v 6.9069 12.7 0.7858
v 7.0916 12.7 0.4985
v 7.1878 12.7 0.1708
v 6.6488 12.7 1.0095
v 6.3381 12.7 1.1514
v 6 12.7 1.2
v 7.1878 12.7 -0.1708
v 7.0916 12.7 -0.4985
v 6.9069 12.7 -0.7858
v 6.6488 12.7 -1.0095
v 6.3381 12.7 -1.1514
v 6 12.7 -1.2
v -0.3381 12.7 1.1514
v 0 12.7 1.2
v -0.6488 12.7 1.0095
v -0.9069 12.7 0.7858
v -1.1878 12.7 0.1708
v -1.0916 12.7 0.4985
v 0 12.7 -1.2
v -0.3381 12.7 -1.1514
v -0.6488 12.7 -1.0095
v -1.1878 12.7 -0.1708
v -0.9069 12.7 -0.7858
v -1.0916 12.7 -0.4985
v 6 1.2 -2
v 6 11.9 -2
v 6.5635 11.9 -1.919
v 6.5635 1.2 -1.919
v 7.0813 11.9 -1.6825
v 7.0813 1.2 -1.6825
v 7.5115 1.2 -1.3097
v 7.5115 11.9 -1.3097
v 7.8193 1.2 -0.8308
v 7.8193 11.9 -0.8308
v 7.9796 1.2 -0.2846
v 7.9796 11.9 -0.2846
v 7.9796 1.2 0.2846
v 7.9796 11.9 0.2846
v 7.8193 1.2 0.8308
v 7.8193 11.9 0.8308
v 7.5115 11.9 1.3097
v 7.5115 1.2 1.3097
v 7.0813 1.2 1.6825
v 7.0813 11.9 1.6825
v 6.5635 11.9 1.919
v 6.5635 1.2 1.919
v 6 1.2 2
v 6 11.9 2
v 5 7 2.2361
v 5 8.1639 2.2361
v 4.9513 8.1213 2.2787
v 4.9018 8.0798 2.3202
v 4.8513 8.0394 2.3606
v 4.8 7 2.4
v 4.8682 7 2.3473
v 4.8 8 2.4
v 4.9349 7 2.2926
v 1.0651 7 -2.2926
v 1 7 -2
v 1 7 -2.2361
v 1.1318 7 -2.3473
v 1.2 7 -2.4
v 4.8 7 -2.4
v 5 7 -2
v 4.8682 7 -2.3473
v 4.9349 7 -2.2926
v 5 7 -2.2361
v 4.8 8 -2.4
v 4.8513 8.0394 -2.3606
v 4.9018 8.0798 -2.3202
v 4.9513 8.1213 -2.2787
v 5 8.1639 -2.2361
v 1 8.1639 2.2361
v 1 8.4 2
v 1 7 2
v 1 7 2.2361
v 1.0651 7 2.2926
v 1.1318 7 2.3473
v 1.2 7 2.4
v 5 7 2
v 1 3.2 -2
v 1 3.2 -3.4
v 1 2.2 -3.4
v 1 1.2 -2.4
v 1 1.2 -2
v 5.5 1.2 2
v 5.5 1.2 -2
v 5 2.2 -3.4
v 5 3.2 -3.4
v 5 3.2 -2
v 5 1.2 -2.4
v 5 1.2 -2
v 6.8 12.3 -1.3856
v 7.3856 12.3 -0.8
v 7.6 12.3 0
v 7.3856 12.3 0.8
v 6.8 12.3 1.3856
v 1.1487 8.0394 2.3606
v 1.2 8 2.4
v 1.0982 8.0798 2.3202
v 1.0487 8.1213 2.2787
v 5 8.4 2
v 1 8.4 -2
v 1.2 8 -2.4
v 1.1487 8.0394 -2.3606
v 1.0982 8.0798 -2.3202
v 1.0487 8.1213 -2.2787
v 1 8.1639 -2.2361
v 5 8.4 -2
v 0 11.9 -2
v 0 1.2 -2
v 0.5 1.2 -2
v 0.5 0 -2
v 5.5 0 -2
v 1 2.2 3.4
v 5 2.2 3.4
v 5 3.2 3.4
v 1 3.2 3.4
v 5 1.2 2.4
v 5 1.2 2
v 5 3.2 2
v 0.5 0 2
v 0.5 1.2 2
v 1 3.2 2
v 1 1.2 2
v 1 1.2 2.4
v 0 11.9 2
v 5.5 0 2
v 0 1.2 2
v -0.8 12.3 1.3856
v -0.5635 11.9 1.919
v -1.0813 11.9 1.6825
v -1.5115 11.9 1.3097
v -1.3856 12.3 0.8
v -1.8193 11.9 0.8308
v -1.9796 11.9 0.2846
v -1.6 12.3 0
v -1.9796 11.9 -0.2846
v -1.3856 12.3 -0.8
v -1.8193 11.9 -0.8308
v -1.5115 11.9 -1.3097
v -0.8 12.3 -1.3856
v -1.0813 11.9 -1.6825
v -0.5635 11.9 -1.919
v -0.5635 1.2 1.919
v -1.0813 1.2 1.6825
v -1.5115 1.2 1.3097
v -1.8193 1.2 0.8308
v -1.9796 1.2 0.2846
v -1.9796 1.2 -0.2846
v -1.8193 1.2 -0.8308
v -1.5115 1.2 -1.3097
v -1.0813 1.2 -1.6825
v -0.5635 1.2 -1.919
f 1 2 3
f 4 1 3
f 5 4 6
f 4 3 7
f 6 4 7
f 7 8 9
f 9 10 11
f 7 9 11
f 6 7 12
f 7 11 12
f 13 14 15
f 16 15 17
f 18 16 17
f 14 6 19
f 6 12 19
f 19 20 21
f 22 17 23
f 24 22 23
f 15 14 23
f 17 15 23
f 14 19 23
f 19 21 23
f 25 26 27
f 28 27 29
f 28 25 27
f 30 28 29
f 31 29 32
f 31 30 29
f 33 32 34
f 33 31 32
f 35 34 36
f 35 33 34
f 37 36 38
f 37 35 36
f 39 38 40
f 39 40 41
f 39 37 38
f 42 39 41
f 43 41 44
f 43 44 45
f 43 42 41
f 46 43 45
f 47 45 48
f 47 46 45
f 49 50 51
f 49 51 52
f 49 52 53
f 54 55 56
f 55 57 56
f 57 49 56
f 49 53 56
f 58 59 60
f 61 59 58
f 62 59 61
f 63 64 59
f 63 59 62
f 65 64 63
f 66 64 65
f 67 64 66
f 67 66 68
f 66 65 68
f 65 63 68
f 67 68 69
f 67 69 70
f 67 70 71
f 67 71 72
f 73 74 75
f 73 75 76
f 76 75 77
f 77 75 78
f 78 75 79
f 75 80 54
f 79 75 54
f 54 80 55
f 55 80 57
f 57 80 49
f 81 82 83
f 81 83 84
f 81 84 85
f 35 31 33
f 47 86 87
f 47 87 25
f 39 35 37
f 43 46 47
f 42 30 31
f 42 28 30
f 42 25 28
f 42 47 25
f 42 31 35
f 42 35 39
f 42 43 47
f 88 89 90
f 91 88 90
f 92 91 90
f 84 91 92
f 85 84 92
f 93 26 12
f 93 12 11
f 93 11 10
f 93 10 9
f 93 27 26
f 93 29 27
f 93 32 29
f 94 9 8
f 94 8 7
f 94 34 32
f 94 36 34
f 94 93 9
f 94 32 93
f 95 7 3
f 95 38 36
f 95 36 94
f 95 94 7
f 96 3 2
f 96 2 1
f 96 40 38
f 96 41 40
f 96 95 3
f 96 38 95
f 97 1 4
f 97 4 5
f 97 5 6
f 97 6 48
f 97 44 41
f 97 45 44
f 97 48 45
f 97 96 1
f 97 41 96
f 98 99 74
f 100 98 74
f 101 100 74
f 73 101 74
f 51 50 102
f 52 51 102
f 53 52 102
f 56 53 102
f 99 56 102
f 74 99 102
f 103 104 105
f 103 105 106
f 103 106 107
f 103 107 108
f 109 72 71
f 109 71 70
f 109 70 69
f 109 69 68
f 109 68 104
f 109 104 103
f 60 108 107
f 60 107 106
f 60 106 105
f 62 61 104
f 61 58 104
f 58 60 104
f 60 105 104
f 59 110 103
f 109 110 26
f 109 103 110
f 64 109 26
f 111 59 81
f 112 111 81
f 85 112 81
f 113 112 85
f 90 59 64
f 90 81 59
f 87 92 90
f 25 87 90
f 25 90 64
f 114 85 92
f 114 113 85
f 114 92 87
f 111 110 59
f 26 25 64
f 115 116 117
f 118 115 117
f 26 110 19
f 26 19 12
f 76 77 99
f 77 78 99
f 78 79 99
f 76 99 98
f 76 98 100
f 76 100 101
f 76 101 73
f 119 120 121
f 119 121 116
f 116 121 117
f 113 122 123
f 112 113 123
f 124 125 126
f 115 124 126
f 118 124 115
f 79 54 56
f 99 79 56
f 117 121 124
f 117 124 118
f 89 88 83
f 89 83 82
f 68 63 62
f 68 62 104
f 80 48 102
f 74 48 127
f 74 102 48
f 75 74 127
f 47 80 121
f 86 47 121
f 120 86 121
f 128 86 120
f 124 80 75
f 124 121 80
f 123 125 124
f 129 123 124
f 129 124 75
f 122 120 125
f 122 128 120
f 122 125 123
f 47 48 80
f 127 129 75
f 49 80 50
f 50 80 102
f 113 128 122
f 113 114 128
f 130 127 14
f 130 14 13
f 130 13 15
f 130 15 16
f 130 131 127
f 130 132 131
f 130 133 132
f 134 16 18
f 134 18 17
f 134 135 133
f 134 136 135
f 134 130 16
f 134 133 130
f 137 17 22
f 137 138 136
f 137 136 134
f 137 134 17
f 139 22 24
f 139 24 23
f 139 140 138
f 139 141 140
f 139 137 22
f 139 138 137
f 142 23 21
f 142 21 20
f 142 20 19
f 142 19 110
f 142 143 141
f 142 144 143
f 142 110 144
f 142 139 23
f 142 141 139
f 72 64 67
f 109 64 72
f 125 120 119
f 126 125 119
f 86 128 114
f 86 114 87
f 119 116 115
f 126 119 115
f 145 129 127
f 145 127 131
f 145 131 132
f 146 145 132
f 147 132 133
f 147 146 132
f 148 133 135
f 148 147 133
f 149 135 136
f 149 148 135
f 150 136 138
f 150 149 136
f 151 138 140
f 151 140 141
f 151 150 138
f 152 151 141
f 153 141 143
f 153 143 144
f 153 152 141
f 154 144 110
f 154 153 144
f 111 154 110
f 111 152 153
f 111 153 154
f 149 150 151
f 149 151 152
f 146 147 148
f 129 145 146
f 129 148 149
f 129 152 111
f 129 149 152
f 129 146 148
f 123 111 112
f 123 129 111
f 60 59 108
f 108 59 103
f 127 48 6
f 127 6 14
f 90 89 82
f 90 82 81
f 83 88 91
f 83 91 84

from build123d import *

# Parameters (mm, degrees)
EXTRUDE_1_DEPTH      = 12.7
CUT_EXTRUDE_1_REACH  = 17.534
SKETCH_3_W           = 2.5
SKETCH_3_H           = 1.2
EXTRUDE_2_DEPTH      = 2
EXTRUDE_2_DEPTH_BACK = 2
SKETCH_5_W           = 1.4
SKETCH_5_H           = 2
CUT_EXTRUDE_2_REACH  = 17.39
CHAMFER_1_SIZE       = 1
CHAMFER_2_SIZE       = 0.8


with BuildPart() as part:
    # 草图2 → 凸台-拉伸1 (new body)
    with BuildSketch(Plane(origin=(0, 0, 0), x_dir=(1, 0, 0), z_dir=(0, 1, 0))):
        with BuildLine():
            Line((0, 2), (6, 2))
            ThreePointArc((6, 2), (8, 0), (6, -2))
            Line((6, -2), (0, -2))
            ThreePointArc((0, -2), (-2, 0), (0, 2))
        make_face()
    extrude(amount=EXTRUDE_1_DEPTH)

    # 草图3 → 切除-拉伸1 (cut, up to next)
    with BuildSketch(Plane.XY.offset(2), mode=Mode.PRIVATE) as cut_extrude_1_sk1:
        with Locations((-0.75, 0.6)):
            Rectangle(SKETCH_3_W, SKETCH_3_H)
    cut_extrude_1_tool1 = extrude(cut_extrude_1_sk1.sketch, amount=-CUT_EXTRUDE_1_REACH, mode=Mode.PRIVATE) & part.part
    # 草图3 → 切除-拉伸1 (cut, up to next)
    with BuildSketch(Plane.XY.offset(2), mode=Mode.PRIVATE) as cut_extrude_1_sk2:
        with Locations((6.75, 0.6)):
            Rectangle(SKETCH_3_W, SKETCH_3_H)
    cut_extrude_1_tool2 = extrude(cut_extrude_1_sk2.sketch, amount=-CUT_EXTRUDE_1_REACH, mode=Mode.PRIVATE) & part.part
    add(cut_extrude_1_tool1.solids().sort_by_distance((-0.75, 0.6, 2))[0], mode=Mode.SUBTRACT)
    add(cut_extrude_1_tool2.solids().sort_by_distance((6.75, 0.6, 2))[0], mode=Mode.SUBTRACT)

    # 草图5 → 凸台-拉伸2 (add, two sides: drawn at the far end of the back side and taken through both)
    with BuildSketch(Plane.ZY.offset(-3).offset(-EXTRUDE_2_DEPTH_BACK)):
        Polygon((-2, 7), (-2.4, 7), (-2.4, 8), (-2, 8.4), align=None)
        Polygon((2, 8.4), (2, 7), (2.4, 7), (2.4, 8), align=None)
        with Locations((-2.7, 2.2)):
            Rectangle(SKETCH_5_W, SKETCH_5_H)
        with Locations((2.7, 2.2)):
            Rectangle(SKETCH_5_W, SKETCH_5_H)
    extrude(amount=EXTRUDE_2_DEPTH + EXTRUDE_2_DEPTH_BACK)

    # 草图6 → 切除-拉伸2 (cut, up to next)
    with BuildSketch(Plane(origin=(0, 12.7, 0), x_dir=(1, 0, 0), z_dir=(0, 1, 0)), mode=Mode.PRIVATE) as cut_extrude_2_sk1:
        with BuildLine():
            Line((1.2, 2.4), (1, 2.4))
            Line((1, 2.4), (1, 2.236067977))
            ThreePointArc((1, 2.236067977), (1.098232815, 2.320189986), (1.2, 2.4))
        make_face()
    cut_extrude_2_tool1 = extrude(cut_extrude_2_sk1.sketch, amount=-CUT_EXTRUDE_2_REACH, mode=Mode.PRIVATE) & part.part
    # 草图6 → 切除-拉伸2 (cut, up to next)
    with BuildSketch(Plane(origin=(0, 12.7, 0), x_dir=(1, 0, 0), z_dir=(0, 1, 0)), mode=Mode.PRIVATE) as cut_extrude_2_sk2:
        with BuildLine():
            Line((4.8, -2.4), (5, -2.4))
            Line((5, -2.4), (5, -2.236067977))
            ThreePointArc((5, -2.236067977), (4.901767185, -2.320189986), (4.8, -2.4))
        make_face()
    cut_extrude_2_tool2 = extrude(cut_extrude_2_sk2.sketch, amount=-CUT_EXTRUDE_2_REACH, mode=Mode.PRIVATE) & part.part
    # 草图6 → 切除-拉伸2 (cut, up to next)
    with BuildSketch(Plane(origin=(0, 12.7, 0), x_dir=(1, 0, 0), z_dir=(0, 1, 0)), mode=Mode.PRIVATE) as cut_extrude_2_sk3:
        with BuildLine():
            Line((5, 2.4), (4.8, 2.4))
            ThreePointArc((4.8, 2.4), (4.901767185, 2.320189986), (5, 2.236067977))
            Line((5, 2.236067977), (5, 2.4))
        make_face()
    cut_extrude_2_tool3 = extrude(cut_extrude_2_sk3.sketch, amount=-CUT_EXTRUDE_2_REACH, mode=Mode.PRIVATE) & part.part
    # 草图6 → 切除-拉伸2 (cut, up to next)
    with BuildSketch(Plane(origin=(0, 12.7, 0), x_dir=(1, 0, 0), z_dir=(0, 1, 0)), mode=Mode.PRIVATE) as cut_extrude_2_sk4:
        with BuildLine():
            Line((1, -2.236067977), (1, -2.4))
            Line((1, -2.4), (1.2, -2.4))
            ThreePointArc((1.2, -2.4), (1.098232815, -2.320189986), (1, -2.236067977))
        make_face()
    cut_extrude_2_tool4 = extrude(cut_extrude_2_sk4.sketch, amount=-CUT_EXTRUDE_2_REACH, mode=Mode.PRIVATE) & part.part
    add(cut_extrude_2_tool1.solids().sort_by_distance((1.065681, 12.7, -2.346155))[0], mode=Mode.SUBTRACT)
    add(cut_extrude_2_tool2.solids().sort_by_distance((4.934319, 12.7, 2.346155))[0], mode=Mode.SUBTRACT)
    add(cut_extrude_2_tool3.solids().sort_by_distance((4.934319, 12.7, -2.346155))[0], mode=Mode.SUBTRACT)
    add(cut_extrude_2_tool4.solids().sort_by_distance((1.065681, 12.7, 2.346155))[0], mode=Mode.SUBTRACT)

    # 倒角1
    chamfer_1_edges = [part.edges().sort_by_distance(p)[0] for p in [
        (3, 1.2, -3.4),
        (3, 1.2, 3.4),
    ]]
    chamfer(chamfer_1_edges, length=CHAMFER_1_SIZE)

    # 倒角2
    chamfer_2_edges = [part.edges().sort_by_distance(p)[0] for p in [
        (8, 12.7, 0),
        (3, 12.7, -2),
        (-2, 12.7, 0),
        (3, 12.7, 2),
    ]]
    chamfer(chamfer_2_edges, length=CHAMFER_2_SIZE)


solid = part.part
